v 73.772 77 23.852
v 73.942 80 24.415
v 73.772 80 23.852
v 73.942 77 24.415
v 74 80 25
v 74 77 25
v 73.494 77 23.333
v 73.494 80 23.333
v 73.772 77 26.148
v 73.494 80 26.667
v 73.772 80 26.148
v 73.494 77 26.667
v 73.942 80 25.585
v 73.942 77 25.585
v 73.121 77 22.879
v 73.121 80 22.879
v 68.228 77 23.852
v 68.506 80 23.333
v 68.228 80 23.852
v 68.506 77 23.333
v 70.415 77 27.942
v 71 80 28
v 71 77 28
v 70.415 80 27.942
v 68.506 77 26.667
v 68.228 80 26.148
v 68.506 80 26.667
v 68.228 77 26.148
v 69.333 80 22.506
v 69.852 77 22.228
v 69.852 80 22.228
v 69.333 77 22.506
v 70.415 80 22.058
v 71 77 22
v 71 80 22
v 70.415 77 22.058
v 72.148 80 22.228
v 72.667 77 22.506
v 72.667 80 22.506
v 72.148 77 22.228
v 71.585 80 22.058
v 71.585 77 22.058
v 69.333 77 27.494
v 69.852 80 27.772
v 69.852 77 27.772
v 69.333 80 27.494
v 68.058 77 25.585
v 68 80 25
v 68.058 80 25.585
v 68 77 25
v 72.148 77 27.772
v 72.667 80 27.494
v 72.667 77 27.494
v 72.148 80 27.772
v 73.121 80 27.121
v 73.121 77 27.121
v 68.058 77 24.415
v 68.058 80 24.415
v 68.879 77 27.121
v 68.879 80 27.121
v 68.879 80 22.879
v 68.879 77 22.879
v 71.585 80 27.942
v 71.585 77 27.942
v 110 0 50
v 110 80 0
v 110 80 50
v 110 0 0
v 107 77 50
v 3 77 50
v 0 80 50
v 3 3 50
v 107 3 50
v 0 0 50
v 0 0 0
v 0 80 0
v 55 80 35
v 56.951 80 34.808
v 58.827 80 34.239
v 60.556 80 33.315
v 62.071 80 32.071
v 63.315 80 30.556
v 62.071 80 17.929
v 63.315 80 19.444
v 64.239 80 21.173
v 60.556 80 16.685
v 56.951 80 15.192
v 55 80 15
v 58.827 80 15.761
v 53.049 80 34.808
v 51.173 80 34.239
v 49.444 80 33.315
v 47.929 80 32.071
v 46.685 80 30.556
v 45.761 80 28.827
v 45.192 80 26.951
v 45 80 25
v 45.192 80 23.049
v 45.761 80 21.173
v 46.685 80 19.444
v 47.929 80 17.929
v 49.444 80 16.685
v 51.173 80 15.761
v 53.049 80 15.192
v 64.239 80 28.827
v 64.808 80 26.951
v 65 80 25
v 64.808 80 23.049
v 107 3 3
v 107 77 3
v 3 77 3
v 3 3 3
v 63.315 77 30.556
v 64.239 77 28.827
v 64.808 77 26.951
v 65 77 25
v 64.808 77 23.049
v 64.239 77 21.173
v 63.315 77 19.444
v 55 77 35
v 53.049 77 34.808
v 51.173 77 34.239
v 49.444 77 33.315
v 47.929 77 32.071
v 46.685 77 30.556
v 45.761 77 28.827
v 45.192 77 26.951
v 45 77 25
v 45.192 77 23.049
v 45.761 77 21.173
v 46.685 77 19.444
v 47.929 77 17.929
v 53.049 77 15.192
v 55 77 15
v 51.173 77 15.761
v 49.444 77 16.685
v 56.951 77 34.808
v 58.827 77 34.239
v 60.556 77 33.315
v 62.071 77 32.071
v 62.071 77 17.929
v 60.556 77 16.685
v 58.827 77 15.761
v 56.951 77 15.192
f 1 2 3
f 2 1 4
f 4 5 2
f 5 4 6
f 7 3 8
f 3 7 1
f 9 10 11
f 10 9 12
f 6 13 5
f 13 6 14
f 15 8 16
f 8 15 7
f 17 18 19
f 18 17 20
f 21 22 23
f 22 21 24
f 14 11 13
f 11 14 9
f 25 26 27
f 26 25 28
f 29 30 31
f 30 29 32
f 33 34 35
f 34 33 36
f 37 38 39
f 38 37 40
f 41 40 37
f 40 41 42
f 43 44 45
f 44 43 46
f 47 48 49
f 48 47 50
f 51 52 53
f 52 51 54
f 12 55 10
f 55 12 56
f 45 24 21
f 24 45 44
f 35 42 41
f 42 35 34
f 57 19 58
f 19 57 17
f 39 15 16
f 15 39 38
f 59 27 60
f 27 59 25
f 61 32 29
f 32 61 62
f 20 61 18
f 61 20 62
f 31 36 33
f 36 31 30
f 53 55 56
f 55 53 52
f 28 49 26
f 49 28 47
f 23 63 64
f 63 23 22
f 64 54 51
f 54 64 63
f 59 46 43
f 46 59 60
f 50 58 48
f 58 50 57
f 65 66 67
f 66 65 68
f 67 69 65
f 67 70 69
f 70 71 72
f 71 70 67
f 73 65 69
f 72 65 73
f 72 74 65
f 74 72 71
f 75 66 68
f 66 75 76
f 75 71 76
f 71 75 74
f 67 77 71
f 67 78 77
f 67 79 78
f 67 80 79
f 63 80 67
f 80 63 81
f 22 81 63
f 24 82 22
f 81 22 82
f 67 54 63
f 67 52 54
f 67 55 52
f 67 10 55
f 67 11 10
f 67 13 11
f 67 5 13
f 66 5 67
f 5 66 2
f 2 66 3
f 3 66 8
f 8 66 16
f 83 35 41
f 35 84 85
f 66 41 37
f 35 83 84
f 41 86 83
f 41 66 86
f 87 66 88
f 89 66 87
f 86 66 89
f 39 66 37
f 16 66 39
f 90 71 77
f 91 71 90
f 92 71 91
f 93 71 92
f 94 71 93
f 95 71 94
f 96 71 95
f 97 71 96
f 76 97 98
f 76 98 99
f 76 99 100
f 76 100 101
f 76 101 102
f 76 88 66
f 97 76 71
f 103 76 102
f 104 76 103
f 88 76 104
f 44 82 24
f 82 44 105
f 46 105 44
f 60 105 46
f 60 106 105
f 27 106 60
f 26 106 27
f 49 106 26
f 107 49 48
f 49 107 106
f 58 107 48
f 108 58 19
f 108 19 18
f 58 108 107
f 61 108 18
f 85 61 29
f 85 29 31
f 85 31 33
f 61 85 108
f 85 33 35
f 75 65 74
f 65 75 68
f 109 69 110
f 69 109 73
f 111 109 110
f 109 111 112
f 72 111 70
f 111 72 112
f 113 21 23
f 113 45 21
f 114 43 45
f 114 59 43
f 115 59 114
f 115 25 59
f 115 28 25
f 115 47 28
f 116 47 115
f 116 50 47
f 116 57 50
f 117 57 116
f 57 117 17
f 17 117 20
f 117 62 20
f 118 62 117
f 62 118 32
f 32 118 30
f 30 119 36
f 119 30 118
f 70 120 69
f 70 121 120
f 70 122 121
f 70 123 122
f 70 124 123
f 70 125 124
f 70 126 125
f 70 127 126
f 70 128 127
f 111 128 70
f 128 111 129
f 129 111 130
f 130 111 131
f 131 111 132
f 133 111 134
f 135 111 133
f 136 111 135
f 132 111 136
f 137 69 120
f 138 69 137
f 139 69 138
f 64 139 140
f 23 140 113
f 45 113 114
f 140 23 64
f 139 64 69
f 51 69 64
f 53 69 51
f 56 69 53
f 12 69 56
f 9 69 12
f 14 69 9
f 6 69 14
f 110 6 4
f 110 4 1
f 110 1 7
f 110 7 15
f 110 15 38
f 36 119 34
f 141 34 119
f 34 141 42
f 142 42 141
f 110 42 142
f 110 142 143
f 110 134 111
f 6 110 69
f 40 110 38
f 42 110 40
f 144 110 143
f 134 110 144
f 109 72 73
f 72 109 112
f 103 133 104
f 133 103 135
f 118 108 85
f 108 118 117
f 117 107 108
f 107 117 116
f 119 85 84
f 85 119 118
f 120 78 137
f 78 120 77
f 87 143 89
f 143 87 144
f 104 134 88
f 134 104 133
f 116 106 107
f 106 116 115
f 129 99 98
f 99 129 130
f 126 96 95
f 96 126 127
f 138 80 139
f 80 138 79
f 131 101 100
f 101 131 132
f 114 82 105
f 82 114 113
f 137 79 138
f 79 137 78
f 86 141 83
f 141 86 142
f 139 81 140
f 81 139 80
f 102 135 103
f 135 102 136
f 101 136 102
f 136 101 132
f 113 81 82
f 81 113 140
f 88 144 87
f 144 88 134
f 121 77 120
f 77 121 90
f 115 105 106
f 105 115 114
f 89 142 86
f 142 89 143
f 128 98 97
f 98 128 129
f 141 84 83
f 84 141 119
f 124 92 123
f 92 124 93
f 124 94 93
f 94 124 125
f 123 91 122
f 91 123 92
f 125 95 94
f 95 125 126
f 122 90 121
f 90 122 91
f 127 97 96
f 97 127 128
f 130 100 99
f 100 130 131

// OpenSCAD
$fn = 32;

// ----------------------------------------------------------------------
// Vent box: roundvent enclosure
// ----------------------------------------------------------------------

// --- parameters (mm) ---
box_l = 110;              // box length, X
box_w = 80;               // box width, Y
box_h = 50;               // box height, Z
wall_t = 3;               // shell wall thickness
vent_d = 20;              // central vent diameter
ring_d = 6;               // ring hole diameter
n_ring = 6;               // holes in the ring
ring_r = 16;              // ring radius

ring_step = 360 / n_ring;  // ring hole angular step

difference() {
  cube([box_l, box_w, box_h]);
  translate([wall_t, wall_t, wall_t])
    cube([box_l - 2 * wall_t, box_w - 2 * wall_t, box_h]);
  translate([box_l / 2, box_w - wall_t - 1, box_h / 2])
    rotate([-90, 0, 0]) cylinder(h = wall_t + 2, d = vent_d);
  for (i = [0 : n_ring - 1])
    translate([box_l / 2, box_w - wall_t - 1, box_h / 2])
      rotate([0, 0, i * ring_step])
        translate([ring_r, 0, 0]) rotate([-90, 0, 0])
          cylinder(h = wall_t + 2, d = ring_d);
}
